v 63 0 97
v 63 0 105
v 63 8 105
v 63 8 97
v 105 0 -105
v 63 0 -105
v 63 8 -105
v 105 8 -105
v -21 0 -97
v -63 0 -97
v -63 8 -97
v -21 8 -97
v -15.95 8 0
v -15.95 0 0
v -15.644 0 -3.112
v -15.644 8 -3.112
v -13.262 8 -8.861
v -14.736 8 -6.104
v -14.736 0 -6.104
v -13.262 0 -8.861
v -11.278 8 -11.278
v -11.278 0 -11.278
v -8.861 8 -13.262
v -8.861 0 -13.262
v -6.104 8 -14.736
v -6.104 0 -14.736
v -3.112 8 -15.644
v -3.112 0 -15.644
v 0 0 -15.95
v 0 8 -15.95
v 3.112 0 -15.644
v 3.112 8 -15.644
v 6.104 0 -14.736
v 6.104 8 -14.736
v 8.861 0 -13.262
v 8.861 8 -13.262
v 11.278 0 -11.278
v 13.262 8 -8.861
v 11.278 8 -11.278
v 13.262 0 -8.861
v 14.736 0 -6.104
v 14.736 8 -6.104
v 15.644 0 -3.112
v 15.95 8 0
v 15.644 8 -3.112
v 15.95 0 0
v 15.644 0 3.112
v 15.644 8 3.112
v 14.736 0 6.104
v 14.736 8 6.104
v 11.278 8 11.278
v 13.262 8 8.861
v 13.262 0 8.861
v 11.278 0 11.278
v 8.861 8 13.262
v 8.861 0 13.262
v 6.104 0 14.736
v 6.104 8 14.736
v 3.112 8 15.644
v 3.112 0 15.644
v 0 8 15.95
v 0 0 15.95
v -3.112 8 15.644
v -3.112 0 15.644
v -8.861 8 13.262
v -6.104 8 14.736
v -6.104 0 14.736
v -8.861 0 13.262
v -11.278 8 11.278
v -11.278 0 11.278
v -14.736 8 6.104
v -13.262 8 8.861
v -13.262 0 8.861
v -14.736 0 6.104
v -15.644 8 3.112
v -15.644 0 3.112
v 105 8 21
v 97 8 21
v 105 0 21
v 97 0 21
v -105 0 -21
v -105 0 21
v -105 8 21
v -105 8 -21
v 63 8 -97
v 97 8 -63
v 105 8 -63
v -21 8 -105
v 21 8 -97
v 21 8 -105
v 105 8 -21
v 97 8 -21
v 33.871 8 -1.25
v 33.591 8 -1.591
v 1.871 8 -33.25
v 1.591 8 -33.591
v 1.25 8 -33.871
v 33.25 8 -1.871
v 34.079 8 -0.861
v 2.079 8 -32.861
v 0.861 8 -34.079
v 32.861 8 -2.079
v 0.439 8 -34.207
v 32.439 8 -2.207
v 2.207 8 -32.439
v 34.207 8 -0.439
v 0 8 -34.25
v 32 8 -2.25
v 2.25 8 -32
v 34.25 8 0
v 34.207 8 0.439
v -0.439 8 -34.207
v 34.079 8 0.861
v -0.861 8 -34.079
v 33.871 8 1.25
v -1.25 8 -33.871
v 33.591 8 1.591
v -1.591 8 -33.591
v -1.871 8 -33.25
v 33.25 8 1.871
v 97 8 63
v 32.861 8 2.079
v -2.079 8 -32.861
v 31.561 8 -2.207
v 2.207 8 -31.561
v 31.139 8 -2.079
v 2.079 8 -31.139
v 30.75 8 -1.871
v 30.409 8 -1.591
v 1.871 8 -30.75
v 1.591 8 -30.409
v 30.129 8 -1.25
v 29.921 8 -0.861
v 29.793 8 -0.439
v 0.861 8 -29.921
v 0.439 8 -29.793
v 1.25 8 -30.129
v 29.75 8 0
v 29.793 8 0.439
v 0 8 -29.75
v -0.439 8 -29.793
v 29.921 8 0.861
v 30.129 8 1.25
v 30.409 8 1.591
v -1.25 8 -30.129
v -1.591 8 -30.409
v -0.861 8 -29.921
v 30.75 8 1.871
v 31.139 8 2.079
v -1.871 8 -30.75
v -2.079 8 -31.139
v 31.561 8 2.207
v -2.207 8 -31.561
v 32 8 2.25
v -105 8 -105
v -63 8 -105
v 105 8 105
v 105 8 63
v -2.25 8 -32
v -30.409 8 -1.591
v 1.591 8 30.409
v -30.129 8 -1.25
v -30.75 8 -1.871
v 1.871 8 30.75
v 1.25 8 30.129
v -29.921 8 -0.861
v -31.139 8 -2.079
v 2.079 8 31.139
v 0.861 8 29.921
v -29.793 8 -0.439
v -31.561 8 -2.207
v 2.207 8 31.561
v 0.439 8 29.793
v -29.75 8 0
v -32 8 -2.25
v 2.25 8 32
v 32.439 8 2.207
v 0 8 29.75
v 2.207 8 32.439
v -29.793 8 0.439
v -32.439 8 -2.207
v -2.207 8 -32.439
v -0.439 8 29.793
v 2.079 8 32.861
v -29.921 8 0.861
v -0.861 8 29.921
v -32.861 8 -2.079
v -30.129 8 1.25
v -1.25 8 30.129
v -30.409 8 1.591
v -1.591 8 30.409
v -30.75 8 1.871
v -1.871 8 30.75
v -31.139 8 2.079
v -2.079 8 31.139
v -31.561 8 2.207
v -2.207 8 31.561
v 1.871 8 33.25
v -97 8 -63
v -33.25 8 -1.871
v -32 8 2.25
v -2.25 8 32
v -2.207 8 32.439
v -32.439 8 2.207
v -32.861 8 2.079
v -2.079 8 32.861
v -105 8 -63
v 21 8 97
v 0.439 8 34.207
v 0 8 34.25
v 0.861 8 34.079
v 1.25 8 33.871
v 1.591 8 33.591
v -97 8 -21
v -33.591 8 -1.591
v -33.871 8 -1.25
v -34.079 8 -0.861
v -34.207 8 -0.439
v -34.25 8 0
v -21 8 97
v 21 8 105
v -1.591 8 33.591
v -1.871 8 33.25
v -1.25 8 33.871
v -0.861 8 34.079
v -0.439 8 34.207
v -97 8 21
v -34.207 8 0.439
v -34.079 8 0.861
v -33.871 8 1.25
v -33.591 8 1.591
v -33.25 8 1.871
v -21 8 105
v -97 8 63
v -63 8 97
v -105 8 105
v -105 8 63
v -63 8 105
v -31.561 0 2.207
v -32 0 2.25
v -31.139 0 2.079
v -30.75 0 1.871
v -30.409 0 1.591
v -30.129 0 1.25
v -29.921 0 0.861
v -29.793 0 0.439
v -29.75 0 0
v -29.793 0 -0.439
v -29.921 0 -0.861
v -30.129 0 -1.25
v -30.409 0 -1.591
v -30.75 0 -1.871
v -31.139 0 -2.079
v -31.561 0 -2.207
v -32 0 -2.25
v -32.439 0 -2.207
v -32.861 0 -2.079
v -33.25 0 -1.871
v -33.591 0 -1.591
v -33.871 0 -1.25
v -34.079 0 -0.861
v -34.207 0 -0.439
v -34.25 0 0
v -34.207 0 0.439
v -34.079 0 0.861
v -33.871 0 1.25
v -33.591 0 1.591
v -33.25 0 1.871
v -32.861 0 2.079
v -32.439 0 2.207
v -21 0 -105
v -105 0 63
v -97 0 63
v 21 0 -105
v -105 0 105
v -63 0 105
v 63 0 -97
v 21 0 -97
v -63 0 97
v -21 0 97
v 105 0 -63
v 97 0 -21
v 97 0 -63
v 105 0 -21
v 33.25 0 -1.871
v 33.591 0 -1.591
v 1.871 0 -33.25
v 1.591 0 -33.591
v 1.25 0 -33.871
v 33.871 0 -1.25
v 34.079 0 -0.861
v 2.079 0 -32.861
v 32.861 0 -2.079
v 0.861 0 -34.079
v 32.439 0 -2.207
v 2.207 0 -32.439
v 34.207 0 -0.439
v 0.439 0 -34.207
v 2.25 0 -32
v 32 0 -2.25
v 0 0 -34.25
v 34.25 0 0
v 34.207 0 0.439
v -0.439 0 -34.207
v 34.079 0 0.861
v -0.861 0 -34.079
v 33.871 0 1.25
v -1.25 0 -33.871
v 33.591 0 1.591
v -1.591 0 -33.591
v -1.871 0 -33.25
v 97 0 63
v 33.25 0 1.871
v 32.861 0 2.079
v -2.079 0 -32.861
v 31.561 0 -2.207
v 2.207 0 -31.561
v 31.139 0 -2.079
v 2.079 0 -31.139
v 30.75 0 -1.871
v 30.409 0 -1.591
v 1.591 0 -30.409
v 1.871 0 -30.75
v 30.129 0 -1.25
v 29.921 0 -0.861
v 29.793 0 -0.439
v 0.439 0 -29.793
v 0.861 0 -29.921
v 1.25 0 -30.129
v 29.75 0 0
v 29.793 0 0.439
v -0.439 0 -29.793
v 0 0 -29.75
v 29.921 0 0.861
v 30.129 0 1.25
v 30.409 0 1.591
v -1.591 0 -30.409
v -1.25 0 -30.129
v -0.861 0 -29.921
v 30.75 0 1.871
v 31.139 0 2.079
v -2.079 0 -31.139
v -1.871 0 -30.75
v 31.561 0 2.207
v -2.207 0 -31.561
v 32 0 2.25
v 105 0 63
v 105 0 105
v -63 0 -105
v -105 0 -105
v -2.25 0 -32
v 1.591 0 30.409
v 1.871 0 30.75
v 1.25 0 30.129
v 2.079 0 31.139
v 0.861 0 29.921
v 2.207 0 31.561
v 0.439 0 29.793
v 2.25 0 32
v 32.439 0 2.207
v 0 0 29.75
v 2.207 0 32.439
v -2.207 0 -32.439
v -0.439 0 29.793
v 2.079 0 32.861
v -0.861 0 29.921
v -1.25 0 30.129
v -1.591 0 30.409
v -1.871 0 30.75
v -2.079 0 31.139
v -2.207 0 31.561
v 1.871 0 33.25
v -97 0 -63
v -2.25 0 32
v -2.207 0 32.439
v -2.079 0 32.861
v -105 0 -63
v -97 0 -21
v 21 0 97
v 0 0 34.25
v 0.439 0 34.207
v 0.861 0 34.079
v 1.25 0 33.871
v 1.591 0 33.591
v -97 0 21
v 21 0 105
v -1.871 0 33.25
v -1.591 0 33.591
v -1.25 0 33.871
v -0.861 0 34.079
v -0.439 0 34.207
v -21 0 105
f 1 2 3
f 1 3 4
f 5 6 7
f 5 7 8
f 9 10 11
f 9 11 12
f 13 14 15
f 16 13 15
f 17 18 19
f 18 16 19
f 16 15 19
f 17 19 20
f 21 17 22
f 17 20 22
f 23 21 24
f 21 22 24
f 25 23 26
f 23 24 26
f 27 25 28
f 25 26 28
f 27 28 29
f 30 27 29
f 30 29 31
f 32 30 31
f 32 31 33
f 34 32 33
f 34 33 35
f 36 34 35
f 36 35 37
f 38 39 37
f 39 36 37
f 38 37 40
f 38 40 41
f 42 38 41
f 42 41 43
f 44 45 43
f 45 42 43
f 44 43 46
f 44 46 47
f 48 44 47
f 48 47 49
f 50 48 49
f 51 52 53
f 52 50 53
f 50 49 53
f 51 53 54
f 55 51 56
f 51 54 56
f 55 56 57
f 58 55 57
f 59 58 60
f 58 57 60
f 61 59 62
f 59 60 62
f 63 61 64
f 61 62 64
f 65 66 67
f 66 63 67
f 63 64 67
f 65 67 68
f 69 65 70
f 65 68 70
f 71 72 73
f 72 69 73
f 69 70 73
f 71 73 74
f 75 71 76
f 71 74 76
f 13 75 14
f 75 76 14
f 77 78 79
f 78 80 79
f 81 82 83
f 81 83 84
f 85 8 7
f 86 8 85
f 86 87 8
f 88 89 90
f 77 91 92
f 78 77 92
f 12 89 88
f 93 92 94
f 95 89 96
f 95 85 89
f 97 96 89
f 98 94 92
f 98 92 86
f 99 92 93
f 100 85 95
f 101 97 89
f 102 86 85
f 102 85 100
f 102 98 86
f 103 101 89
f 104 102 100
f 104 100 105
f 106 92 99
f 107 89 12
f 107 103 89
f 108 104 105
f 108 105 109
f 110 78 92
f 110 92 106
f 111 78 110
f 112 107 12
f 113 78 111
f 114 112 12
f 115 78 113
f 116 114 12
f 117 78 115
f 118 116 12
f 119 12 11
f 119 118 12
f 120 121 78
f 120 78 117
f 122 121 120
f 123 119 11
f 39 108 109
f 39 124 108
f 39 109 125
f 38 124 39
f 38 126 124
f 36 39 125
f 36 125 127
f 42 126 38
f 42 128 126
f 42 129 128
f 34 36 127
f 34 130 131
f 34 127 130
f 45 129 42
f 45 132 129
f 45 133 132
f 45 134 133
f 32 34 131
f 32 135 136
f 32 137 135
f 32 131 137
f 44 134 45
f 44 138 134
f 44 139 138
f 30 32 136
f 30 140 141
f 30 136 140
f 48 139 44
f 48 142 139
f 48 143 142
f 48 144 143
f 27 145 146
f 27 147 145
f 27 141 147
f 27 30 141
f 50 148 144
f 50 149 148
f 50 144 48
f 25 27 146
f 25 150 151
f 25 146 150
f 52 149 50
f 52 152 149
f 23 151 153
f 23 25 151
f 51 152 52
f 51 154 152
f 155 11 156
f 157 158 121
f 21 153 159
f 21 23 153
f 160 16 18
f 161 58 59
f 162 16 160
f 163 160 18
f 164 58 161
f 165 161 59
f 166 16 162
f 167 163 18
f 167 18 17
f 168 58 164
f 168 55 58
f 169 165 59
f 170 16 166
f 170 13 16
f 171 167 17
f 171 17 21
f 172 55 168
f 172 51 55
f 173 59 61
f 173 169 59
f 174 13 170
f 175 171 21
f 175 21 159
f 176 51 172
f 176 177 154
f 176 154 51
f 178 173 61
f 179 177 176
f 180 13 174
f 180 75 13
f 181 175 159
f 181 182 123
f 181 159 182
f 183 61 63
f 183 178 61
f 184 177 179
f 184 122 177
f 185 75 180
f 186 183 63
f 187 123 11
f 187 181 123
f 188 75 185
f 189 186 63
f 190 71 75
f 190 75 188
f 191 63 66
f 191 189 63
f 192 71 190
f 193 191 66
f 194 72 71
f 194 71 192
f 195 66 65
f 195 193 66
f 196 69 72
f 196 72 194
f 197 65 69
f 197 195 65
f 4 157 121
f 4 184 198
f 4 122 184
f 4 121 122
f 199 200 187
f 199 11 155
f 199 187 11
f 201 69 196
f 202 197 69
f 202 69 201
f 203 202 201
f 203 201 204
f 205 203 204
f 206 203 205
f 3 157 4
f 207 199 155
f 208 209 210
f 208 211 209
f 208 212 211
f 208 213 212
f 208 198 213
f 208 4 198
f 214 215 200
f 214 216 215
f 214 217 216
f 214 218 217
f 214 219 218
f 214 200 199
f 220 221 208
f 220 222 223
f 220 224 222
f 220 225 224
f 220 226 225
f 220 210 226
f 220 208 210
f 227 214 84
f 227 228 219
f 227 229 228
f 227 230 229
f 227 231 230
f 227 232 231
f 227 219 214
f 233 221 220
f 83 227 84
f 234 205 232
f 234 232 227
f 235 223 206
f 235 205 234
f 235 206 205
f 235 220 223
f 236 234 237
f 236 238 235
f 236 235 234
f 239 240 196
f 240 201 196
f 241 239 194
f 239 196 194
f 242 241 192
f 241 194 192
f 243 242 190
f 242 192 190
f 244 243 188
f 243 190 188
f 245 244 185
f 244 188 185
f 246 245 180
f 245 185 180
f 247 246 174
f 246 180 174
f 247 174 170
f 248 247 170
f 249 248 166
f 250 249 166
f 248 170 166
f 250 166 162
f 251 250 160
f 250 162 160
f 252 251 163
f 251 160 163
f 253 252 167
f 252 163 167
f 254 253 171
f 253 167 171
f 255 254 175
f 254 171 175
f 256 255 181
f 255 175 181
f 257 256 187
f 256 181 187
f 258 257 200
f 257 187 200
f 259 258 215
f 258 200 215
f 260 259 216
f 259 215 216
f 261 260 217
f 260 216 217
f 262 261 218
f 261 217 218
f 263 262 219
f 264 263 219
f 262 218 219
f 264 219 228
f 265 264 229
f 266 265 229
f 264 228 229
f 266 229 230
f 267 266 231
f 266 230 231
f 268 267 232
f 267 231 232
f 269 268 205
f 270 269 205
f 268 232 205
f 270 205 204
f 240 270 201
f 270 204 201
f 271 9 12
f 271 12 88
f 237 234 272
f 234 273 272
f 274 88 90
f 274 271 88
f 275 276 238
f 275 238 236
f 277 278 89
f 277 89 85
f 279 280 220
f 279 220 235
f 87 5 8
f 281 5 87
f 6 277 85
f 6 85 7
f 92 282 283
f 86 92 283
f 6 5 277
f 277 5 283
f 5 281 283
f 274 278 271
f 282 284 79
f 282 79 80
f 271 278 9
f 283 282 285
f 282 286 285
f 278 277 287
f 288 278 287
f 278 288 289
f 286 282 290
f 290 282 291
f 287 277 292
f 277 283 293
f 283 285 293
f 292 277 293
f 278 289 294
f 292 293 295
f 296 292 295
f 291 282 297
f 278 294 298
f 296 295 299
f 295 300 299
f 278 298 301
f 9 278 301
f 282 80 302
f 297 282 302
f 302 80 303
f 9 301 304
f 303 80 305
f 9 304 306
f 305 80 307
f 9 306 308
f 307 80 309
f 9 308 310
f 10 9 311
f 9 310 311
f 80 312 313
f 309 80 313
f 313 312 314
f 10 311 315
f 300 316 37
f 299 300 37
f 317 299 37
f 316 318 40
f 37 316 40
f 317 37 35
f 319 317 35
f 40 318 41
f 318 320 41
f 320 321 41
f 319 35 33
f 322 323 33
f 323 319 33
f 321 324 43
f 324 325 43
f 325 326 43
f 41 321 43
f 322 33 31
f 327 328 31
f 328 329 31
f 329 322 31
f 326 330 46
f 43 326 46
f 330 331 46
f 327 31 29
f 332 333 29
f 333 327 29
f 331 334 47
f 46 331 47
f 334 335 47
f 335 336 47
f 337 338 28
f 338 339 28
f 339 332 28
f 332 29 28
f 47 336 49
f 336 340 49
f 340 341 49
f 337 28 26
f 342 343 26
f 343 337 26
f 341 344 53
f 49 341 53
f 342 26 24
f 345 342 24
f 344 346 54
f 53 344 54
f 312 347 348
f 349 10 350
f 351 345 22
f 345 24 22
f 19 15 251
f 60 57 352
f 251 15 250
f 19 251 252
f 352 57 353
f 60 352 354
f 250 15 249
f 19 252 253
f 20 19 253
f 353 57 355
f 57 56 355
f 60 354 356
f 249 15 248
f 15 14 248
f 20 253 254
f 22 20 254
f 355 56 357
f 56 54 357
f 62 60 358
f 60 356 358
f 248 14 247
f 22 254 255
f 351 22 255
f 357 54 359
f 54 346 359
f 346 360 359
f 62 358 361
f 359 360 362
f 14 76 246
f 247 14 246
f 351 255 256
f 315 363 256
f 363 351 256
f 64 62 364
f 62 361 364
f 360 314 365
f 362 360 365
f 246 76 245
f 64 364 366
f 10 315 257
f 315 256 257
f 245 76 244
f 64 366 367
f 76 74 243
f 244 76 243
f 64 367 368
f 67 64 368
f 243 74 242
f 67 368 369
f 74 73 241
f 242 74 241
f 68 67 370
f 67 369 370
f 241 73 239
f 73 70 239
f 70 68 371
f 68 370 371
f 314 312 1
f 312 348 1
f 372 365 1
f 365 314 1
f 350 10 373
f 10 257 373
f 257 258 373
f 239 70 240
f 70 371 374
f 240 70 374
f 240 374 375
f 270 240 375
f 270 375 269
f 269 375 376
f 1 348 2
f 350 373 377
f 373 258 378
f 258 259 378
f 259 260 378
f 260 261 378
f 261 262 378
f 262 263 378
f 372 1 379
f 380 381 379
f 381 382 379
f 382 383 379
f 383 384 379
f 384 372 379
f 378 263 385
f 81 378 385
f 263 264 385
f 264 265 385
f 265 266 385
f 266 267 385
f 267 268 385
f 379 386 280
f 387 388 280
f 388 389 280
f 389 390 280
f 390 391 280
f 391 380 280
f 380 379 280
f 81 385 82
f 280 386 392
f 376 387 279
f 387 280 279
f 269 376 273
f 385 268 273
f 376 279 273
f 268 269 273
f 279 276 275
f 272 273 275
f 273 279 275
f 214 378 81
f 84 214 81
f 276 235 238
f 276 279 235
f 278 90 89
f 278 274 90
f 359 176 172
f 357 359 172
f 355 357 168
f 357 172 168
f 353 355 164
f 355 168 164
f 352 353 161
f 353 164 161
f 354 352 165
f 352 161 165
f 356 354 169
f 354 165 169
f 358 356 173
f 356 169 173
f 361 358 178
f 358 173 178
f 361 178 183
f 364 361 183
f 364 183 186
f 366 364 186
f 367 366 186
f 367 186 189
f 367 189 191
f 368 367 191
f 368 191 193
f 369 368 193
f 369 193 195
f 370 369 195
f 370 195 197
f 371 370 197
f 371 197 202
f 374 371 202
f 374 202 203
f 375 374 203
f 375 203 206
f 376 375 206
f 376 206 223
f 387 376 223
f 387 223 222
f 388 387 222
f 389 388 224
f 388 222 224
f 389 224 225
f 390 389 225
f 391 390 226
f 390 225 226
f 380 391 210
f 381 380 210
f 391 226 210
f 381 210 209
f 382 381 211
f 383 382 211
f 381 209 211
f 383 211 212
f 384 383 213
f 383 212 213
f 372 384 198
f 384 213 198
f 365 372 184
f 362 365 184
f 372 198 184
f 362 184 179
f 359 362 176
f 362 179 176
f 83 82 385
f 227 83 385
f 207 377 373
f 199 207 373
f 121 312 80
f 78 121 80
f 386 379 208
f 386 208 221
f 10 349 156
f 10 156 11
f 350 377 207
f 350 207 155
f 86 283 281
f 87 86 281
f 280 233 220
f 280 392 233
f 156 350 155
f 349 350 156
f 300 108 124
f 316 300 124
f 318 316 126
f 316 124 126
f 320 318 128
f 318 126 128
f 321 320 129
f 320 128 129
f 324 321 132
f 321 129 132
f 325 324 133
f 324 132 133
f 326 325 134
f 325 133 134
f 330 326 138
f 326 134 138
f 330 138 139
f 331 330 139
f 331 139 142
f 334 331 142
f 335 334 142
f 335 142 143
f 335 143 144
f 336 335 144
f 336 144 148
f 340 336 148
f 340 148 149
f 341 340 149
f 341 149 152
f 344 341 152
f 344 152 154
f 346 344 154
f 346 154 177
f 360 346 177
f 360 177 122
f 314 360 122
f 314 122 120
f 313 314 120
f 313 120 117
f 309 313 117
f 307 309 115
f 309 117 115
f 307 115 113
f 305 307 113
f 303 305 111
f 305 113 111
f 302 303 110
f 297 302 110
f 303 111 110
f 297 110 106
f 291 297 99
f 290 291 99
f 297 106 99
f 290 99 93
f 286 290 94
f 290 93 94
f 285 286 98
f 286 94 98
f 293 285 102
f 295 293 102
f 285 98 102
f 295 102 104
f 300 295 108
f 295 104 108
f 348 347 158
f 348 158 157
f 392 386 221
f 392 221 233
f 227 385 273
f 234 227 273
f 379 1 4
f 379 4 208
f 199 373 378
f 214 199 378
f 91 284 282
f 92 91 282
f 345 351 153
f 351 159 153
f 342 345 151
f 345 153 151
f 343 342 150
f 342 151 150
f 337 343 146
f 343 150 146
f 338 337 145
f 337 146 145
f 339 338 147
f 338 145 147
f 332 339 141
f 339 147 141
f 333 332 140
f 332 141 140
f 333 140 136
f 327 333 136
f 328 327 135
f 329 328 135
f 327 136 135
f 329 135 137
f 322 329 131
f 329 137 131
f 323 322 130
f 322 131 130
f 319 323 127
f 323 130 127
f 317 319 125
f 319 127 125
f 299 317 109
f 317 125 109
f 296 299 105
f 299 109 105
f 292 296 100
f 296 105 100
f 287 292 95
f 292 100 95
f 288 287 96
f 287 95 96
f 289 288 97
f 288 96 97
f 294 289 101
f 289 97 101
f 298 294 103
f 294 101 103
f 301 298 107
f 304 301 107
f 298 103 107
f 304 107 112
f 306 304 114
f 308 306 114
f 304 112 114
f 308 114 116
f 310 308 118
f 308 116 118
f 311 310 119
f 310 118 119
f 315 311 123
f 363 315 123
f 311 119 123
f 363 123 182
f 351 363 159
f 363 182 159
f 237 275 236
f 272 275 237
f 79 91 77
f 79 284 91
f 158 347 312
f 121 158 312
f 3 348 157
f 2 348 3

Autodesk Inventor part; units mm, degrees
ref_plane "YZ Plane" through (0, 0, 0) normal (1, 0, 0) x (0, 1, 0)
ref_plane "XZ Plane" through (0, 0, 0) normal (0, 1, 0) x (-1, 0, 0)
ref_plane "XY Plane" through (0, 0, 0) normal (0, 0, 1) x (1, 0, 0)
sketch "Sketch2" plane through (0, 0, 0) normal (0, 1, 0) x (-1, 0, 0)
  line L0 (-105, 105) -> (105, 105)
  line L1 (105, 105) -> (105, -105)
  line L2 (105, -105) -> (-105, -105)
  line L3 (-105, -105) -> (-105, 105)
  line L4 (-105, 105) -> (105, -105) construction
  line L5 (105, 105) -> (-105, -105) construction
  circle A0 centre (0, 0) radius 15.95
  dimension "d11" = 210
  dimension "d12" = 210
  dimension "d13" = 31.9
extrude "Extrusion2" add sketch "Sketch2" along normal blind 8
sketch "Sketch3" plane through (0, 0, 0) normal (0, -1, 0) x (1, 0, 0)
  point P0 (0, 0)
  point P1 (32, 0)
  dimension "d16" = 32
hole "Hole1" at (32, 0, 0) direction (0, 1, 0) diameter 4.5 depth 8 tip angle 118
pattern_circular "Circular Pattern1" count 4 over 360 about axis through (0, 0, 0) along (0, 1, 0) of "Hole1"
sketch "Sketch4" plane through (0, 0, 0) normal (0, -1, 0) x (1, 0, 0)
  circle A0 centre (0, 32) radius 2.25 projected
  circle A1 centre (-32, 0) radius 2.25 projected
  circle A2 centre (0, -32) radius 2.25 projected
  circle A3 centre (32, 0) radius 2.25 projected
  circle A4 centre (0, 0) radius 15.95 projected
  line L0 (105, 105) -> (-105, 105) projected
  line L1 (-105, 105) -> (-105, -105) projected
  line L2 (-105, -105) -> (105, -105) projected
  line L3 (105, -105) -> (105, 105) projected
  line L4 (-105, -63) -> (-97, -63)
  line L5 (-97, -63) -> (-97, -21)
  line L6 (-97, -21) -> (-105, -21)
  line L7 (-105, -21) -> (-105, -63)
  line L8 (-105, 21) -> (-97, 21)
  line L9 (-97, 21) -> (-97, 63)
  line L10 (-97, 63) -> (-105, 63)
  line L11 (-105, 63) -> (-105, 21)
  line L12 (-97, -21) -> (-97, 21) construction
  line L13 (-97, 63) -> (-97, 105) construction
  line L14 (-97, -63) -> (-97, -105)
  dimension "d27" = 8
extrude "Extrusion3" cut sketch "Sketch4" against normal through all contours L10 L9 L8 L1 | L4 L1 L6 L5
sketch "Sketch5" plane through (0, 0, 0) normal (0, -1, 0) x (1, 0, 0)
  line L0 (-97, 21) -> (-105, 21) projected
  line L1 (-105, 21) -> (-105, -21) projected
  line L2 (-105, -21) -> (-97, -21) projected
  line L3 (-97, -21) -> (-97, -63) projected
  line L4 (-97, -63) -> (-105, -63) projected
  line L5 (-105, -63) -> (-105, -105) projected
  line L6 (-105, -105) -> (105, -105) projected
  line L7 (105, -105) -> (105, 105) projected
  line L8 (105, 105) -> (-105, 105) projected
  line L9 (-105, 105) -> (-105, 63) projected
  line L10 (-105, 63) -> (-97, 63) projected
  line L11 (-97, 63) -> (-97, 21) projected
  circle A0 centre (0, 32) radius 2.25 projected
  circle A1 centre (-32, 0) radius 2.25 projected
  circle A2 centre (0, -32) radius 2.25 projected
  circle A3 centre (32, 0) radius 2.25 projected
  circle A4 centre (0, 0) radius 15.95 projected
  line L12 (63, -105) -> (21, -105)
  line L13 (21, -105) -> (21, -97)
  line L14 (21, -97) -> (63, -97)
  line L15 (63, -97) -> (63, -105)
  line L16 (-21, -105) -> (-63, -105)
  line L17 (-63, -105) -> (-63, -97)
  line L18 (-63, -97) -> (-21, -97)
  line L19 (-21, -97) -> (-21, -105)
  line L20 (63, -97) -> (105, -97) construction
  line L21 (21, -97) -> (-21, -97) construction
  line L22 (-63, -97) -> (-105, -97) construction
  dimension "d31" = 8
extrude "Extrusion4" cut sketch "Sketch5" against normal through all contours L6 L13 L14 L15 | L17 L18 L19 L6
mirror "Mirror1" about plane through (0, 0, 0) normal (1, 0, 0) of "Extrusion3"
mirror "Mirror2" about plane through (0, 0, 0) normal (0, 0, 1) of "Extrusion4"
equation "\"d11\" = d12"
properties part number "M01 - Base Top" material "Polycarbonate, Clear"
